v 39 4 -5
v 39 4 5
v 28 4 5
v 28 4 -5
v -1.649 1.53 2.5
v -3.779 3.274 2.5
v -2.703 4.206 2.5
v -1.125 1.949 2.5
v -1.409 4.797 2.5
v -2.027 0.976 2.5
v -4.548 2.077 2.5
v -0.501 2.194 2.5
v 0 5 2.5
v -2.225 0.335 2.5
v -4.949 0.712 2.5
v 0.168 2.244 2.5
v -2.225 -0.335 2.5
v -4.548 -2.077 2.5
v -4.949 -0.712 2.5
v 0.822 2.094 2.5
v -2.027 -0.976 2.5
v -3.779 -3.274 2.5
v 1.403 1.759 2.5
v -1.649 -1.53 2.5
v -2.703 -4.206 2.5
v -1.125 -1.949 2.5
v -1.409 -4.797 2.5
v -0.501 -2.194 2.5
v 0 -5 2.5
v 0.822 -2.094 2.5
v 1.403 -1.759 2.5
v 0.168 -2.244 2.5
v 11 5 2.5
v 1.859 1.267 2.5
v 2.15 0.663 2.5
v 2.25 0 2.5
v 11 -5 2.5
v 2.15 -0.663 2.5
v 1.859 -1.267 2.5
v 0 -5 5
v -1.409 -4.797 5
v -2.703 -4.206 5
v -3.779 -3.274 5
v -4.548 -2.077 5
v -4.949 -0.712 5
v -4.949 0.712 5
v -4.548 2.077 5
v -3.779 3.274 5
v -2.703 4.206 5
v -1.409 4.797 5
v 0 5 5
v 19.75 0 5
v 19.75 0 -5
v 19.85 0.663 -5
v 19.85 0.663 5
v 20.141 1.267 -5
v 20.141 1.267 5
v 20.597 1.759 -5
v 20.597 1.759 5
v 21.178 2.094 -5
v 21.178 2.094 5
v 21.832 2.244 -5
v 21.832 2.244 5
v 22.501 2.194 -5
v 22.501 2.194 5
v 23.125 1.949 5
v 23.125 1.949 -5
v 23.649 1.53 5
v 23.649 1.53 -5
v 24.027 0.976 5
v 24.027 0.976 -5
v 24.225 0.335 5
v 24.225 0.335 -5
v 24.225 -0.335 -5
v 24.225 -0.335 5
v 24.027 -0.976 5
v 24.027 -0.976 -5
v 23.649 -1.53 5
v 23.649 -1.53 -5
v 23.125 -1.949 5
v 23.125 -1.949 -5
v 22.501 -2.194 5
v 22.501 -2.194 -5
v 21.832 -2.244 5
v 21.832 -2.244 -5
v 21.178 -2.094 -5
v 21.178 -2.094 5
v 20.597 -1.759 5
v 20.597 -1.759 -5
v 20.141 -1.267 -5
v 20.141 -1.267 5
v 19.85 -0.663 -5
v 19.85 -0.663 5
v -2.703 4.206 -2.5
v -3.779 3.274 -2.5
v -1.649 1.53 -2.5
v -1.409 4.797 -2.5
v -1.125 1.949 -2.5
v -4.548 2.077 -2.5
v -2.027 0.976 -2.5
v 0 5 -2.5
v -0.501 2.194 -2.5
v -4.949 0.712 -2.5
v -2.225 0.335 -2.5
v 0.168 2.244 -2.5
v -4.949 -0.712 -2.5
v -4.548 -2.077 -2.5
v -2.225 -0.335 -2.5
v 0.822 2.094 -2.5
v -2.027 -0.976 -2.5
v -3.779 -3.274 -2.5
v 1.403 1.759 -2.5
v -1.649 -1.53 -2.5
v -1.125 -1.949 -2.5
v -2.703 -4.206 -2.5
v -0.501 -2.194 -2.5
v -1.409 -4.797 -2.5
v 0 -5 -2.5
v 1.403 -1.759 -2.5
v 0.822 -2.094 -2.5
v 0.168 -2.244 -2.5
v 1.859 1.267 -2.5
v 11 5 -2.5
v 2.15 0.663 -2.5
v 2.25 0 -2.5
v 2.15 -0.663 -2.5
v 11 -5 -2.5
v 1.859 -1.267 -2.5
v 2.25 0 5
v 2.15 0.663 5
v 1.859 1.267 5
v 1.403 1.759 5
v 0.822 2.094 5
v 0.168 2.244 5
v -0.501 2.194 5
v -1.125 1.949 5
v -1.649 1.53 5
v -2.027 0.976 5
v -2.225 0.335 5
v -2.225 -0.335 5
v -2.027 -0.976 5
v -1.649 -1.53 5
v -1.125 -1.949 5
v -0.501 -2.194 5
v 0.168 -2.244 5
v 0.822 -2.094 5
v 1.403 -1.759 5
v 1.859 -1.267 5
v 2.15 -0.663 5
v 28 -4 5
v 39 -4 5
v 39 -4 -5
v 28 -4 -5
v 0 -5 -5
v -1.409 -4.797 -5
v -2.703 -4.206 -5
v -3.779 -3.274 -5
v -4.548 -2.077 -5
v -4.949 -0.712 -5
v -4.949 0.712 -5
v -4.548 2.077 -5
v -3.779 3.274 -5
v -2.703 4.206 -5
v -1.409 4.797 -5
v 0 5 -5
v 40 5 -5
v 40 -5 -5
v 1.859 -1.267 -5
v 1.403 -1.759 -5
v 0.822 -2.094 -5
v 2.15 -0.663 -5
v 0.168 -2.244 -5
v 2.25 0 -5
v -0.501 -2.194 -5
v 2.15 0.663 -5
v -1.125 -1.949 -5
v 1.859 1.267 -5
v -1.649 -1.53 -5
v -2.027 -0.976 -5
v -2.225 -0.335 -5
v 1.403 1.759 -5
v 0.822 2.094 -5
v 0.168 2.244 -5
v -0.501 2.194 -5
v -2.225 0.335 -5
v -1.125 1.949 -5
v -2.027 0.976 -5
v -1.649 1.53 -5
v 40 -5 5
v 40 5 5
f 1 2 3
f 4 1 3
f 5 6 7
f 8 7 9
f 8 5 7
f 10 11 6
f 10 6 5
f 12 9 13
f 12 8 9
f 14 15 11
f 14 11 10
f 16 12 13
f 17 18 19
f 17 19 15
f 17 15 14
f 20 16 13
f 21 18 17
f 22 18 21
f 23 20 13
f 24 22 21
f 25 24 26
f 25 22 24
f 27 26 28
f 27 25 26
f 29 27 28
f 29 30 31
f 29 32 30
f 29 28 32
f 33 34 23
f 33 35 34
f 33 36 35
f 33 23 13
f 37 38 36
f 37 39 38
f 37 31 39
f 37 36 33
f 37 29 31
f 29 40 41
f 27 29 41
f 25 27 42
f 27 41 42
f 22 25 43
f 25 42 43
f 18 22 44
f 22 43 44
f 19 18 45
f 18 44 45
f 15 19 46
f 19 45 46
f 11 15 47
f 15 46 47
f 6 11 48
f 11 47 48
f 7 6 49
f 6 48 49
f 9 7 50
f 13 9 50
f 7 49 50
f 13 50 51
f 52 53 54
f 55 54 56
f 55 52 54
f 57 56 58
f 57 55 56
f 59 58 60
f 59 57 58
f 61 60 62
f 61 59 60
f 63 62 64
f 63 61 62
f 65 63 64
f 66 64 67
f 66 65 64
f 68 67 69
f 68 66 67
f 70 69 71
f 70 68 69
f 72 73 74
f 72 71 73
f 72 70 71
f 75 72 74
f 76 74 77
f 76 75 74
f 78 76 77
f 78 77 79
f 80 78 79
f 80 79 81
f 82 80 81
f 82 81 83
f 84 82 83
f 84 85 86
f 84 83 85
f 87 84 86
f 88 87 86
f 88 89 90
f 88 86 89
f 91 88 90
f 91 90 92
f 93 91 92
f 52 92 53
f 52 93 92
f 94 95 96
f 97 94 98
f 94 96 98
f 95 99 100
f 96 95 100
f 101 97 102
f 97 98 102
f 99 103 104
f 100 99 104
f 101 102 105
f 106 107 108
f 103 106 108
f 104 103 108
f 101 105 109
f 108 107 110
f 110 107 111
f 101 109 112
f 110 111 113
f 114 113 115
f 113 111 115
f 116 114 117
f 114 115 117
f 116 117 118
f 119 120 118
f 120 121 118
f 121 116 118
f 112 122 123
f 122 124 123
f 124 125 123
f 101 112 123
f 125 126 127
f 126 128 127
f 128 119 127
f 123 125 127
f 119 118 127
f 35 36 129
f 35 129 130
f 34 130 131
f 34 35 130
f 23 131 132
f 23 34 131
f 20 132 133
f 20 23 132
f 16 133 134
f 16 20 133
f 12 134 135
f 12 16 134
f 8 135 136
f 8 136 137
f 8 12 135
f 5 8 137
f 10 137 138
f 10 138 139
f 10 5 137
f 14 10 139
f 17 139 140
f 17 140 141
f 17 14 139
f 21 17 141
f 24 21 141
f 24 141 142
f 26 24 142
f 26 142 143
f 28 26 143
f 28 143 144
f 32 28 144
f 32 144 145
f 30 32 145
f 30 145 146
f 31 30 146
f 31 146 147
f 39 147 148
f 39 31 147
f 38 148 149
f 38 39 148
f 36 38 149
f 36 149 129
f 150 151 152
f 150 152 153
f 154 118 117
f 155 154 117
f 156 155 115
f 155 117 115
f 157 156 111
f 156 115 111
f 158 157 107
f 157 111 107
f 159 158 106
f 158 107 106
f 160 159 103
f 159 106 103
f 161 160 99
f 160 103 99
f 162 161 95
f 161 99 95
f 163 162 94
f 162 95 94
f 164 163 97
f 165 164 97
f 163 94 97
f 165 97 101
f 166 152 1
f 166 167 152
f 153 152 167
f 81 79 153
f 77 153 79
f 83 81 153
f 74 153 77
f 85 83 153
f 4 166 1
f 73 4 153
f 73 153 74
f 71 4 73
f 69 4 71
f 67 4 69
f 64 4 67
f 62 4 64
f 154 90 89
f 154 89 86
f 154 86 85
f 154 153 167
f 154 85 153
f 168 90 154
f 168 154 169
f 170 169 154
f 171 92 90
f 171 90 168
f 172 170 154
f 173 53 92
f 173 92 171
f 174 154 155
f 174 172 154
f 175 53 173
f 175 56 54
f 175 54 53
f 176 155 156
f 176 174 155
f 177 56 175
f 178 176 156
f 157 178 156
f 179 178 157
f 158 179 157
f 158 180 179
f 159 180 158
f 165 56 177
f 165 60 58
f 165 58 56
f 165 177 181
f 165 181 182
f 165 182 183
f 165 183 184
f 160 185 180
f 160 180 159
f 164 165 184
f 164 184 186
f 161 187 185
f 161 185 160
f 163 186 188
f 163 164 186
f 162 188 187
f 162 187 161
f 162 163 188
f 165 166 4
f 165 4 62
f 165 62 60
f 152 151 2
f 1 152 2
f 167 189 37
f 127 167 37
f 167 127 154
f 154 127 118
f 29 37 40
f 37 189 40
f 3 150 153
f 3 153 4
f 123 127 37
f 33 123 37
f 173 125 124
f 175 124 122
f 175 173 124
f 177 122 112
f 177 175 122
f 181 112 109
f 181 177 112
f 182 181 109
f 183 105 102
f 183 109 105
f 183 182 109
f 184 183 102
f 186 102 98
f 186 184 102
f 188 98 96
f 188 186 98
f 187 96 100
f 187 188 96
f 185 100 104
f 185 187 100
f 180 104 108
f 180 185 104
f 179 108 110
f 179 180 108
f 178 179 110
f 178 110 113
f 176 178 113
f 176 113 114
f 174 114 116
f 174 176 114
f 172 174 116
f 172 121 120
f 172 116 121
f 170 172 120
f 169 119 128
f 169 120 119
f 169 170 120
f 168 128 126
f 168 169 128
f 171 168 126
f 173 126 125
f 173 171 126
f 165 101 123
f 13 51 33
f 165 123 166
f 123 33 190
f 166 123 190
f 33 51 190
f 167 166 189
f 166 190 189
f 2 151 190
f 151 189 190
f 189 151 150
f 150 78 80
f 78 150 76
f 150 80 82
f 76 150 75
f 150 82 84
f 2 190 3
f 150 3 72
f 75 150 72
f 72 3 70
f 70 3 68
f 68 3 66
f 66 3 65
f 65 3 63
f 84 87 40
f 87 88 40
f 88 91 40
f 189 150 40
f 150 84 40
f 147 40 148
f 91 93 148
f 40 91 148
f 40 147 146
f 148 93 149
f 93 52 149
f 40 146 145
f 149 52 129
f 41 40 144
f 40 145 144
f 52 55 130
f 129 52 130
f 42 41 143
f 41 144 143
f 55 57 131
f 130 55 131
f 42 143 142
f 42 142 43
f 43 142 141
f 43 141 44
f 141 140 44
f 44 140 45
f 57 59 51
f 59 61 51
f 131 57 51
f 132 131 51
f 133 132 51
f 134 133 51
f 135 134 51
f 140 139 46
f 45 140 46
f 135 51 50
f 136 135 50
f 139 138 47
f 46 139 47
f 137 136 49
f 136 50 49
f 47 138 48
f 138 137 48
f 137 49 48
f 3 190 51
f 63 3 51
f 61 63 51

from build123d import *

# Parameters (mm, degrees)
SKETCH1_R           = 2.25
BOSS_EXTRUDE1_DEPTH = 5
SKETCH2_R           = 2.25
CUT_EXTRUDE2_DEPTH  = 43.426406871
SKETCH4_W           = 11
SKETCH4_H           = 8
CUT_EXTRUDE5_DEPTH  = 42.533119315
SKETCH5_W           = 16
SKETCH5_H           = 5
CUT_EXTRUDE6_DEPTH  = 42.533119315


with BuildPart() as part:
    # Sketch1 → Boss-Extrude1 (new, symmetric)
    with BuildSketch(Plane.XY):
        with BuildLine():
            Line((0, 5), (40, 5))
            Line((40, 5), (40, -5))
            Line((40, -5), (0, -5))
            ThreePointArc((0, -5), (-5, 0), (0, 5))
        make_face()
        Circle(SKETCH1_R, mode=Mode.SUBTRACT)
    extrude(amount=BOSS_EXTRUDE1_DEPTH, both=True)

    # Sketch2 → Cut-Extrude2 (cut, through all)
    with BuildSketch(Plane(origin=(0, -5, 5), x_dir=(1, 0, 0), z_dir=(0, 0, -1))):
        with Locations(Location((22, -5, 0), (0, 0, 180))):
            Circle(SKETCH2_R)
    extrude(amount=CUT_EXTRUDE2_DEPTH, mode=Mode.SUBTRACT)

    # Sketch4 → Cut-Extrude5 (cut, through all)
    with BuildSketch(Plane(origin=(0, 0, 5), x_dir=(-1, 0, 0), z_dir=(0, 0, -1))):
        with Locations((-33.5, 0)):
            Rectangle(SKETCH4_W, SKETCH4_H)
    extrude(amount=CUT_EXTRUDE5_DEPTH, mode=Mode.SUBTRACT)

    # Sketch5 → Cut-Extrude6 (cut, through all)
    with BuildSketch(Plane.XZ.offset(5)):
        with Locations((3, 0)):
            Rectangle(SKETCH5_W, SKETCH5_H)
    extrude(amount=-CUT_EXTRUDE6_DEPTH, mode=Mode.SUBTRACT)


solid = part.part
